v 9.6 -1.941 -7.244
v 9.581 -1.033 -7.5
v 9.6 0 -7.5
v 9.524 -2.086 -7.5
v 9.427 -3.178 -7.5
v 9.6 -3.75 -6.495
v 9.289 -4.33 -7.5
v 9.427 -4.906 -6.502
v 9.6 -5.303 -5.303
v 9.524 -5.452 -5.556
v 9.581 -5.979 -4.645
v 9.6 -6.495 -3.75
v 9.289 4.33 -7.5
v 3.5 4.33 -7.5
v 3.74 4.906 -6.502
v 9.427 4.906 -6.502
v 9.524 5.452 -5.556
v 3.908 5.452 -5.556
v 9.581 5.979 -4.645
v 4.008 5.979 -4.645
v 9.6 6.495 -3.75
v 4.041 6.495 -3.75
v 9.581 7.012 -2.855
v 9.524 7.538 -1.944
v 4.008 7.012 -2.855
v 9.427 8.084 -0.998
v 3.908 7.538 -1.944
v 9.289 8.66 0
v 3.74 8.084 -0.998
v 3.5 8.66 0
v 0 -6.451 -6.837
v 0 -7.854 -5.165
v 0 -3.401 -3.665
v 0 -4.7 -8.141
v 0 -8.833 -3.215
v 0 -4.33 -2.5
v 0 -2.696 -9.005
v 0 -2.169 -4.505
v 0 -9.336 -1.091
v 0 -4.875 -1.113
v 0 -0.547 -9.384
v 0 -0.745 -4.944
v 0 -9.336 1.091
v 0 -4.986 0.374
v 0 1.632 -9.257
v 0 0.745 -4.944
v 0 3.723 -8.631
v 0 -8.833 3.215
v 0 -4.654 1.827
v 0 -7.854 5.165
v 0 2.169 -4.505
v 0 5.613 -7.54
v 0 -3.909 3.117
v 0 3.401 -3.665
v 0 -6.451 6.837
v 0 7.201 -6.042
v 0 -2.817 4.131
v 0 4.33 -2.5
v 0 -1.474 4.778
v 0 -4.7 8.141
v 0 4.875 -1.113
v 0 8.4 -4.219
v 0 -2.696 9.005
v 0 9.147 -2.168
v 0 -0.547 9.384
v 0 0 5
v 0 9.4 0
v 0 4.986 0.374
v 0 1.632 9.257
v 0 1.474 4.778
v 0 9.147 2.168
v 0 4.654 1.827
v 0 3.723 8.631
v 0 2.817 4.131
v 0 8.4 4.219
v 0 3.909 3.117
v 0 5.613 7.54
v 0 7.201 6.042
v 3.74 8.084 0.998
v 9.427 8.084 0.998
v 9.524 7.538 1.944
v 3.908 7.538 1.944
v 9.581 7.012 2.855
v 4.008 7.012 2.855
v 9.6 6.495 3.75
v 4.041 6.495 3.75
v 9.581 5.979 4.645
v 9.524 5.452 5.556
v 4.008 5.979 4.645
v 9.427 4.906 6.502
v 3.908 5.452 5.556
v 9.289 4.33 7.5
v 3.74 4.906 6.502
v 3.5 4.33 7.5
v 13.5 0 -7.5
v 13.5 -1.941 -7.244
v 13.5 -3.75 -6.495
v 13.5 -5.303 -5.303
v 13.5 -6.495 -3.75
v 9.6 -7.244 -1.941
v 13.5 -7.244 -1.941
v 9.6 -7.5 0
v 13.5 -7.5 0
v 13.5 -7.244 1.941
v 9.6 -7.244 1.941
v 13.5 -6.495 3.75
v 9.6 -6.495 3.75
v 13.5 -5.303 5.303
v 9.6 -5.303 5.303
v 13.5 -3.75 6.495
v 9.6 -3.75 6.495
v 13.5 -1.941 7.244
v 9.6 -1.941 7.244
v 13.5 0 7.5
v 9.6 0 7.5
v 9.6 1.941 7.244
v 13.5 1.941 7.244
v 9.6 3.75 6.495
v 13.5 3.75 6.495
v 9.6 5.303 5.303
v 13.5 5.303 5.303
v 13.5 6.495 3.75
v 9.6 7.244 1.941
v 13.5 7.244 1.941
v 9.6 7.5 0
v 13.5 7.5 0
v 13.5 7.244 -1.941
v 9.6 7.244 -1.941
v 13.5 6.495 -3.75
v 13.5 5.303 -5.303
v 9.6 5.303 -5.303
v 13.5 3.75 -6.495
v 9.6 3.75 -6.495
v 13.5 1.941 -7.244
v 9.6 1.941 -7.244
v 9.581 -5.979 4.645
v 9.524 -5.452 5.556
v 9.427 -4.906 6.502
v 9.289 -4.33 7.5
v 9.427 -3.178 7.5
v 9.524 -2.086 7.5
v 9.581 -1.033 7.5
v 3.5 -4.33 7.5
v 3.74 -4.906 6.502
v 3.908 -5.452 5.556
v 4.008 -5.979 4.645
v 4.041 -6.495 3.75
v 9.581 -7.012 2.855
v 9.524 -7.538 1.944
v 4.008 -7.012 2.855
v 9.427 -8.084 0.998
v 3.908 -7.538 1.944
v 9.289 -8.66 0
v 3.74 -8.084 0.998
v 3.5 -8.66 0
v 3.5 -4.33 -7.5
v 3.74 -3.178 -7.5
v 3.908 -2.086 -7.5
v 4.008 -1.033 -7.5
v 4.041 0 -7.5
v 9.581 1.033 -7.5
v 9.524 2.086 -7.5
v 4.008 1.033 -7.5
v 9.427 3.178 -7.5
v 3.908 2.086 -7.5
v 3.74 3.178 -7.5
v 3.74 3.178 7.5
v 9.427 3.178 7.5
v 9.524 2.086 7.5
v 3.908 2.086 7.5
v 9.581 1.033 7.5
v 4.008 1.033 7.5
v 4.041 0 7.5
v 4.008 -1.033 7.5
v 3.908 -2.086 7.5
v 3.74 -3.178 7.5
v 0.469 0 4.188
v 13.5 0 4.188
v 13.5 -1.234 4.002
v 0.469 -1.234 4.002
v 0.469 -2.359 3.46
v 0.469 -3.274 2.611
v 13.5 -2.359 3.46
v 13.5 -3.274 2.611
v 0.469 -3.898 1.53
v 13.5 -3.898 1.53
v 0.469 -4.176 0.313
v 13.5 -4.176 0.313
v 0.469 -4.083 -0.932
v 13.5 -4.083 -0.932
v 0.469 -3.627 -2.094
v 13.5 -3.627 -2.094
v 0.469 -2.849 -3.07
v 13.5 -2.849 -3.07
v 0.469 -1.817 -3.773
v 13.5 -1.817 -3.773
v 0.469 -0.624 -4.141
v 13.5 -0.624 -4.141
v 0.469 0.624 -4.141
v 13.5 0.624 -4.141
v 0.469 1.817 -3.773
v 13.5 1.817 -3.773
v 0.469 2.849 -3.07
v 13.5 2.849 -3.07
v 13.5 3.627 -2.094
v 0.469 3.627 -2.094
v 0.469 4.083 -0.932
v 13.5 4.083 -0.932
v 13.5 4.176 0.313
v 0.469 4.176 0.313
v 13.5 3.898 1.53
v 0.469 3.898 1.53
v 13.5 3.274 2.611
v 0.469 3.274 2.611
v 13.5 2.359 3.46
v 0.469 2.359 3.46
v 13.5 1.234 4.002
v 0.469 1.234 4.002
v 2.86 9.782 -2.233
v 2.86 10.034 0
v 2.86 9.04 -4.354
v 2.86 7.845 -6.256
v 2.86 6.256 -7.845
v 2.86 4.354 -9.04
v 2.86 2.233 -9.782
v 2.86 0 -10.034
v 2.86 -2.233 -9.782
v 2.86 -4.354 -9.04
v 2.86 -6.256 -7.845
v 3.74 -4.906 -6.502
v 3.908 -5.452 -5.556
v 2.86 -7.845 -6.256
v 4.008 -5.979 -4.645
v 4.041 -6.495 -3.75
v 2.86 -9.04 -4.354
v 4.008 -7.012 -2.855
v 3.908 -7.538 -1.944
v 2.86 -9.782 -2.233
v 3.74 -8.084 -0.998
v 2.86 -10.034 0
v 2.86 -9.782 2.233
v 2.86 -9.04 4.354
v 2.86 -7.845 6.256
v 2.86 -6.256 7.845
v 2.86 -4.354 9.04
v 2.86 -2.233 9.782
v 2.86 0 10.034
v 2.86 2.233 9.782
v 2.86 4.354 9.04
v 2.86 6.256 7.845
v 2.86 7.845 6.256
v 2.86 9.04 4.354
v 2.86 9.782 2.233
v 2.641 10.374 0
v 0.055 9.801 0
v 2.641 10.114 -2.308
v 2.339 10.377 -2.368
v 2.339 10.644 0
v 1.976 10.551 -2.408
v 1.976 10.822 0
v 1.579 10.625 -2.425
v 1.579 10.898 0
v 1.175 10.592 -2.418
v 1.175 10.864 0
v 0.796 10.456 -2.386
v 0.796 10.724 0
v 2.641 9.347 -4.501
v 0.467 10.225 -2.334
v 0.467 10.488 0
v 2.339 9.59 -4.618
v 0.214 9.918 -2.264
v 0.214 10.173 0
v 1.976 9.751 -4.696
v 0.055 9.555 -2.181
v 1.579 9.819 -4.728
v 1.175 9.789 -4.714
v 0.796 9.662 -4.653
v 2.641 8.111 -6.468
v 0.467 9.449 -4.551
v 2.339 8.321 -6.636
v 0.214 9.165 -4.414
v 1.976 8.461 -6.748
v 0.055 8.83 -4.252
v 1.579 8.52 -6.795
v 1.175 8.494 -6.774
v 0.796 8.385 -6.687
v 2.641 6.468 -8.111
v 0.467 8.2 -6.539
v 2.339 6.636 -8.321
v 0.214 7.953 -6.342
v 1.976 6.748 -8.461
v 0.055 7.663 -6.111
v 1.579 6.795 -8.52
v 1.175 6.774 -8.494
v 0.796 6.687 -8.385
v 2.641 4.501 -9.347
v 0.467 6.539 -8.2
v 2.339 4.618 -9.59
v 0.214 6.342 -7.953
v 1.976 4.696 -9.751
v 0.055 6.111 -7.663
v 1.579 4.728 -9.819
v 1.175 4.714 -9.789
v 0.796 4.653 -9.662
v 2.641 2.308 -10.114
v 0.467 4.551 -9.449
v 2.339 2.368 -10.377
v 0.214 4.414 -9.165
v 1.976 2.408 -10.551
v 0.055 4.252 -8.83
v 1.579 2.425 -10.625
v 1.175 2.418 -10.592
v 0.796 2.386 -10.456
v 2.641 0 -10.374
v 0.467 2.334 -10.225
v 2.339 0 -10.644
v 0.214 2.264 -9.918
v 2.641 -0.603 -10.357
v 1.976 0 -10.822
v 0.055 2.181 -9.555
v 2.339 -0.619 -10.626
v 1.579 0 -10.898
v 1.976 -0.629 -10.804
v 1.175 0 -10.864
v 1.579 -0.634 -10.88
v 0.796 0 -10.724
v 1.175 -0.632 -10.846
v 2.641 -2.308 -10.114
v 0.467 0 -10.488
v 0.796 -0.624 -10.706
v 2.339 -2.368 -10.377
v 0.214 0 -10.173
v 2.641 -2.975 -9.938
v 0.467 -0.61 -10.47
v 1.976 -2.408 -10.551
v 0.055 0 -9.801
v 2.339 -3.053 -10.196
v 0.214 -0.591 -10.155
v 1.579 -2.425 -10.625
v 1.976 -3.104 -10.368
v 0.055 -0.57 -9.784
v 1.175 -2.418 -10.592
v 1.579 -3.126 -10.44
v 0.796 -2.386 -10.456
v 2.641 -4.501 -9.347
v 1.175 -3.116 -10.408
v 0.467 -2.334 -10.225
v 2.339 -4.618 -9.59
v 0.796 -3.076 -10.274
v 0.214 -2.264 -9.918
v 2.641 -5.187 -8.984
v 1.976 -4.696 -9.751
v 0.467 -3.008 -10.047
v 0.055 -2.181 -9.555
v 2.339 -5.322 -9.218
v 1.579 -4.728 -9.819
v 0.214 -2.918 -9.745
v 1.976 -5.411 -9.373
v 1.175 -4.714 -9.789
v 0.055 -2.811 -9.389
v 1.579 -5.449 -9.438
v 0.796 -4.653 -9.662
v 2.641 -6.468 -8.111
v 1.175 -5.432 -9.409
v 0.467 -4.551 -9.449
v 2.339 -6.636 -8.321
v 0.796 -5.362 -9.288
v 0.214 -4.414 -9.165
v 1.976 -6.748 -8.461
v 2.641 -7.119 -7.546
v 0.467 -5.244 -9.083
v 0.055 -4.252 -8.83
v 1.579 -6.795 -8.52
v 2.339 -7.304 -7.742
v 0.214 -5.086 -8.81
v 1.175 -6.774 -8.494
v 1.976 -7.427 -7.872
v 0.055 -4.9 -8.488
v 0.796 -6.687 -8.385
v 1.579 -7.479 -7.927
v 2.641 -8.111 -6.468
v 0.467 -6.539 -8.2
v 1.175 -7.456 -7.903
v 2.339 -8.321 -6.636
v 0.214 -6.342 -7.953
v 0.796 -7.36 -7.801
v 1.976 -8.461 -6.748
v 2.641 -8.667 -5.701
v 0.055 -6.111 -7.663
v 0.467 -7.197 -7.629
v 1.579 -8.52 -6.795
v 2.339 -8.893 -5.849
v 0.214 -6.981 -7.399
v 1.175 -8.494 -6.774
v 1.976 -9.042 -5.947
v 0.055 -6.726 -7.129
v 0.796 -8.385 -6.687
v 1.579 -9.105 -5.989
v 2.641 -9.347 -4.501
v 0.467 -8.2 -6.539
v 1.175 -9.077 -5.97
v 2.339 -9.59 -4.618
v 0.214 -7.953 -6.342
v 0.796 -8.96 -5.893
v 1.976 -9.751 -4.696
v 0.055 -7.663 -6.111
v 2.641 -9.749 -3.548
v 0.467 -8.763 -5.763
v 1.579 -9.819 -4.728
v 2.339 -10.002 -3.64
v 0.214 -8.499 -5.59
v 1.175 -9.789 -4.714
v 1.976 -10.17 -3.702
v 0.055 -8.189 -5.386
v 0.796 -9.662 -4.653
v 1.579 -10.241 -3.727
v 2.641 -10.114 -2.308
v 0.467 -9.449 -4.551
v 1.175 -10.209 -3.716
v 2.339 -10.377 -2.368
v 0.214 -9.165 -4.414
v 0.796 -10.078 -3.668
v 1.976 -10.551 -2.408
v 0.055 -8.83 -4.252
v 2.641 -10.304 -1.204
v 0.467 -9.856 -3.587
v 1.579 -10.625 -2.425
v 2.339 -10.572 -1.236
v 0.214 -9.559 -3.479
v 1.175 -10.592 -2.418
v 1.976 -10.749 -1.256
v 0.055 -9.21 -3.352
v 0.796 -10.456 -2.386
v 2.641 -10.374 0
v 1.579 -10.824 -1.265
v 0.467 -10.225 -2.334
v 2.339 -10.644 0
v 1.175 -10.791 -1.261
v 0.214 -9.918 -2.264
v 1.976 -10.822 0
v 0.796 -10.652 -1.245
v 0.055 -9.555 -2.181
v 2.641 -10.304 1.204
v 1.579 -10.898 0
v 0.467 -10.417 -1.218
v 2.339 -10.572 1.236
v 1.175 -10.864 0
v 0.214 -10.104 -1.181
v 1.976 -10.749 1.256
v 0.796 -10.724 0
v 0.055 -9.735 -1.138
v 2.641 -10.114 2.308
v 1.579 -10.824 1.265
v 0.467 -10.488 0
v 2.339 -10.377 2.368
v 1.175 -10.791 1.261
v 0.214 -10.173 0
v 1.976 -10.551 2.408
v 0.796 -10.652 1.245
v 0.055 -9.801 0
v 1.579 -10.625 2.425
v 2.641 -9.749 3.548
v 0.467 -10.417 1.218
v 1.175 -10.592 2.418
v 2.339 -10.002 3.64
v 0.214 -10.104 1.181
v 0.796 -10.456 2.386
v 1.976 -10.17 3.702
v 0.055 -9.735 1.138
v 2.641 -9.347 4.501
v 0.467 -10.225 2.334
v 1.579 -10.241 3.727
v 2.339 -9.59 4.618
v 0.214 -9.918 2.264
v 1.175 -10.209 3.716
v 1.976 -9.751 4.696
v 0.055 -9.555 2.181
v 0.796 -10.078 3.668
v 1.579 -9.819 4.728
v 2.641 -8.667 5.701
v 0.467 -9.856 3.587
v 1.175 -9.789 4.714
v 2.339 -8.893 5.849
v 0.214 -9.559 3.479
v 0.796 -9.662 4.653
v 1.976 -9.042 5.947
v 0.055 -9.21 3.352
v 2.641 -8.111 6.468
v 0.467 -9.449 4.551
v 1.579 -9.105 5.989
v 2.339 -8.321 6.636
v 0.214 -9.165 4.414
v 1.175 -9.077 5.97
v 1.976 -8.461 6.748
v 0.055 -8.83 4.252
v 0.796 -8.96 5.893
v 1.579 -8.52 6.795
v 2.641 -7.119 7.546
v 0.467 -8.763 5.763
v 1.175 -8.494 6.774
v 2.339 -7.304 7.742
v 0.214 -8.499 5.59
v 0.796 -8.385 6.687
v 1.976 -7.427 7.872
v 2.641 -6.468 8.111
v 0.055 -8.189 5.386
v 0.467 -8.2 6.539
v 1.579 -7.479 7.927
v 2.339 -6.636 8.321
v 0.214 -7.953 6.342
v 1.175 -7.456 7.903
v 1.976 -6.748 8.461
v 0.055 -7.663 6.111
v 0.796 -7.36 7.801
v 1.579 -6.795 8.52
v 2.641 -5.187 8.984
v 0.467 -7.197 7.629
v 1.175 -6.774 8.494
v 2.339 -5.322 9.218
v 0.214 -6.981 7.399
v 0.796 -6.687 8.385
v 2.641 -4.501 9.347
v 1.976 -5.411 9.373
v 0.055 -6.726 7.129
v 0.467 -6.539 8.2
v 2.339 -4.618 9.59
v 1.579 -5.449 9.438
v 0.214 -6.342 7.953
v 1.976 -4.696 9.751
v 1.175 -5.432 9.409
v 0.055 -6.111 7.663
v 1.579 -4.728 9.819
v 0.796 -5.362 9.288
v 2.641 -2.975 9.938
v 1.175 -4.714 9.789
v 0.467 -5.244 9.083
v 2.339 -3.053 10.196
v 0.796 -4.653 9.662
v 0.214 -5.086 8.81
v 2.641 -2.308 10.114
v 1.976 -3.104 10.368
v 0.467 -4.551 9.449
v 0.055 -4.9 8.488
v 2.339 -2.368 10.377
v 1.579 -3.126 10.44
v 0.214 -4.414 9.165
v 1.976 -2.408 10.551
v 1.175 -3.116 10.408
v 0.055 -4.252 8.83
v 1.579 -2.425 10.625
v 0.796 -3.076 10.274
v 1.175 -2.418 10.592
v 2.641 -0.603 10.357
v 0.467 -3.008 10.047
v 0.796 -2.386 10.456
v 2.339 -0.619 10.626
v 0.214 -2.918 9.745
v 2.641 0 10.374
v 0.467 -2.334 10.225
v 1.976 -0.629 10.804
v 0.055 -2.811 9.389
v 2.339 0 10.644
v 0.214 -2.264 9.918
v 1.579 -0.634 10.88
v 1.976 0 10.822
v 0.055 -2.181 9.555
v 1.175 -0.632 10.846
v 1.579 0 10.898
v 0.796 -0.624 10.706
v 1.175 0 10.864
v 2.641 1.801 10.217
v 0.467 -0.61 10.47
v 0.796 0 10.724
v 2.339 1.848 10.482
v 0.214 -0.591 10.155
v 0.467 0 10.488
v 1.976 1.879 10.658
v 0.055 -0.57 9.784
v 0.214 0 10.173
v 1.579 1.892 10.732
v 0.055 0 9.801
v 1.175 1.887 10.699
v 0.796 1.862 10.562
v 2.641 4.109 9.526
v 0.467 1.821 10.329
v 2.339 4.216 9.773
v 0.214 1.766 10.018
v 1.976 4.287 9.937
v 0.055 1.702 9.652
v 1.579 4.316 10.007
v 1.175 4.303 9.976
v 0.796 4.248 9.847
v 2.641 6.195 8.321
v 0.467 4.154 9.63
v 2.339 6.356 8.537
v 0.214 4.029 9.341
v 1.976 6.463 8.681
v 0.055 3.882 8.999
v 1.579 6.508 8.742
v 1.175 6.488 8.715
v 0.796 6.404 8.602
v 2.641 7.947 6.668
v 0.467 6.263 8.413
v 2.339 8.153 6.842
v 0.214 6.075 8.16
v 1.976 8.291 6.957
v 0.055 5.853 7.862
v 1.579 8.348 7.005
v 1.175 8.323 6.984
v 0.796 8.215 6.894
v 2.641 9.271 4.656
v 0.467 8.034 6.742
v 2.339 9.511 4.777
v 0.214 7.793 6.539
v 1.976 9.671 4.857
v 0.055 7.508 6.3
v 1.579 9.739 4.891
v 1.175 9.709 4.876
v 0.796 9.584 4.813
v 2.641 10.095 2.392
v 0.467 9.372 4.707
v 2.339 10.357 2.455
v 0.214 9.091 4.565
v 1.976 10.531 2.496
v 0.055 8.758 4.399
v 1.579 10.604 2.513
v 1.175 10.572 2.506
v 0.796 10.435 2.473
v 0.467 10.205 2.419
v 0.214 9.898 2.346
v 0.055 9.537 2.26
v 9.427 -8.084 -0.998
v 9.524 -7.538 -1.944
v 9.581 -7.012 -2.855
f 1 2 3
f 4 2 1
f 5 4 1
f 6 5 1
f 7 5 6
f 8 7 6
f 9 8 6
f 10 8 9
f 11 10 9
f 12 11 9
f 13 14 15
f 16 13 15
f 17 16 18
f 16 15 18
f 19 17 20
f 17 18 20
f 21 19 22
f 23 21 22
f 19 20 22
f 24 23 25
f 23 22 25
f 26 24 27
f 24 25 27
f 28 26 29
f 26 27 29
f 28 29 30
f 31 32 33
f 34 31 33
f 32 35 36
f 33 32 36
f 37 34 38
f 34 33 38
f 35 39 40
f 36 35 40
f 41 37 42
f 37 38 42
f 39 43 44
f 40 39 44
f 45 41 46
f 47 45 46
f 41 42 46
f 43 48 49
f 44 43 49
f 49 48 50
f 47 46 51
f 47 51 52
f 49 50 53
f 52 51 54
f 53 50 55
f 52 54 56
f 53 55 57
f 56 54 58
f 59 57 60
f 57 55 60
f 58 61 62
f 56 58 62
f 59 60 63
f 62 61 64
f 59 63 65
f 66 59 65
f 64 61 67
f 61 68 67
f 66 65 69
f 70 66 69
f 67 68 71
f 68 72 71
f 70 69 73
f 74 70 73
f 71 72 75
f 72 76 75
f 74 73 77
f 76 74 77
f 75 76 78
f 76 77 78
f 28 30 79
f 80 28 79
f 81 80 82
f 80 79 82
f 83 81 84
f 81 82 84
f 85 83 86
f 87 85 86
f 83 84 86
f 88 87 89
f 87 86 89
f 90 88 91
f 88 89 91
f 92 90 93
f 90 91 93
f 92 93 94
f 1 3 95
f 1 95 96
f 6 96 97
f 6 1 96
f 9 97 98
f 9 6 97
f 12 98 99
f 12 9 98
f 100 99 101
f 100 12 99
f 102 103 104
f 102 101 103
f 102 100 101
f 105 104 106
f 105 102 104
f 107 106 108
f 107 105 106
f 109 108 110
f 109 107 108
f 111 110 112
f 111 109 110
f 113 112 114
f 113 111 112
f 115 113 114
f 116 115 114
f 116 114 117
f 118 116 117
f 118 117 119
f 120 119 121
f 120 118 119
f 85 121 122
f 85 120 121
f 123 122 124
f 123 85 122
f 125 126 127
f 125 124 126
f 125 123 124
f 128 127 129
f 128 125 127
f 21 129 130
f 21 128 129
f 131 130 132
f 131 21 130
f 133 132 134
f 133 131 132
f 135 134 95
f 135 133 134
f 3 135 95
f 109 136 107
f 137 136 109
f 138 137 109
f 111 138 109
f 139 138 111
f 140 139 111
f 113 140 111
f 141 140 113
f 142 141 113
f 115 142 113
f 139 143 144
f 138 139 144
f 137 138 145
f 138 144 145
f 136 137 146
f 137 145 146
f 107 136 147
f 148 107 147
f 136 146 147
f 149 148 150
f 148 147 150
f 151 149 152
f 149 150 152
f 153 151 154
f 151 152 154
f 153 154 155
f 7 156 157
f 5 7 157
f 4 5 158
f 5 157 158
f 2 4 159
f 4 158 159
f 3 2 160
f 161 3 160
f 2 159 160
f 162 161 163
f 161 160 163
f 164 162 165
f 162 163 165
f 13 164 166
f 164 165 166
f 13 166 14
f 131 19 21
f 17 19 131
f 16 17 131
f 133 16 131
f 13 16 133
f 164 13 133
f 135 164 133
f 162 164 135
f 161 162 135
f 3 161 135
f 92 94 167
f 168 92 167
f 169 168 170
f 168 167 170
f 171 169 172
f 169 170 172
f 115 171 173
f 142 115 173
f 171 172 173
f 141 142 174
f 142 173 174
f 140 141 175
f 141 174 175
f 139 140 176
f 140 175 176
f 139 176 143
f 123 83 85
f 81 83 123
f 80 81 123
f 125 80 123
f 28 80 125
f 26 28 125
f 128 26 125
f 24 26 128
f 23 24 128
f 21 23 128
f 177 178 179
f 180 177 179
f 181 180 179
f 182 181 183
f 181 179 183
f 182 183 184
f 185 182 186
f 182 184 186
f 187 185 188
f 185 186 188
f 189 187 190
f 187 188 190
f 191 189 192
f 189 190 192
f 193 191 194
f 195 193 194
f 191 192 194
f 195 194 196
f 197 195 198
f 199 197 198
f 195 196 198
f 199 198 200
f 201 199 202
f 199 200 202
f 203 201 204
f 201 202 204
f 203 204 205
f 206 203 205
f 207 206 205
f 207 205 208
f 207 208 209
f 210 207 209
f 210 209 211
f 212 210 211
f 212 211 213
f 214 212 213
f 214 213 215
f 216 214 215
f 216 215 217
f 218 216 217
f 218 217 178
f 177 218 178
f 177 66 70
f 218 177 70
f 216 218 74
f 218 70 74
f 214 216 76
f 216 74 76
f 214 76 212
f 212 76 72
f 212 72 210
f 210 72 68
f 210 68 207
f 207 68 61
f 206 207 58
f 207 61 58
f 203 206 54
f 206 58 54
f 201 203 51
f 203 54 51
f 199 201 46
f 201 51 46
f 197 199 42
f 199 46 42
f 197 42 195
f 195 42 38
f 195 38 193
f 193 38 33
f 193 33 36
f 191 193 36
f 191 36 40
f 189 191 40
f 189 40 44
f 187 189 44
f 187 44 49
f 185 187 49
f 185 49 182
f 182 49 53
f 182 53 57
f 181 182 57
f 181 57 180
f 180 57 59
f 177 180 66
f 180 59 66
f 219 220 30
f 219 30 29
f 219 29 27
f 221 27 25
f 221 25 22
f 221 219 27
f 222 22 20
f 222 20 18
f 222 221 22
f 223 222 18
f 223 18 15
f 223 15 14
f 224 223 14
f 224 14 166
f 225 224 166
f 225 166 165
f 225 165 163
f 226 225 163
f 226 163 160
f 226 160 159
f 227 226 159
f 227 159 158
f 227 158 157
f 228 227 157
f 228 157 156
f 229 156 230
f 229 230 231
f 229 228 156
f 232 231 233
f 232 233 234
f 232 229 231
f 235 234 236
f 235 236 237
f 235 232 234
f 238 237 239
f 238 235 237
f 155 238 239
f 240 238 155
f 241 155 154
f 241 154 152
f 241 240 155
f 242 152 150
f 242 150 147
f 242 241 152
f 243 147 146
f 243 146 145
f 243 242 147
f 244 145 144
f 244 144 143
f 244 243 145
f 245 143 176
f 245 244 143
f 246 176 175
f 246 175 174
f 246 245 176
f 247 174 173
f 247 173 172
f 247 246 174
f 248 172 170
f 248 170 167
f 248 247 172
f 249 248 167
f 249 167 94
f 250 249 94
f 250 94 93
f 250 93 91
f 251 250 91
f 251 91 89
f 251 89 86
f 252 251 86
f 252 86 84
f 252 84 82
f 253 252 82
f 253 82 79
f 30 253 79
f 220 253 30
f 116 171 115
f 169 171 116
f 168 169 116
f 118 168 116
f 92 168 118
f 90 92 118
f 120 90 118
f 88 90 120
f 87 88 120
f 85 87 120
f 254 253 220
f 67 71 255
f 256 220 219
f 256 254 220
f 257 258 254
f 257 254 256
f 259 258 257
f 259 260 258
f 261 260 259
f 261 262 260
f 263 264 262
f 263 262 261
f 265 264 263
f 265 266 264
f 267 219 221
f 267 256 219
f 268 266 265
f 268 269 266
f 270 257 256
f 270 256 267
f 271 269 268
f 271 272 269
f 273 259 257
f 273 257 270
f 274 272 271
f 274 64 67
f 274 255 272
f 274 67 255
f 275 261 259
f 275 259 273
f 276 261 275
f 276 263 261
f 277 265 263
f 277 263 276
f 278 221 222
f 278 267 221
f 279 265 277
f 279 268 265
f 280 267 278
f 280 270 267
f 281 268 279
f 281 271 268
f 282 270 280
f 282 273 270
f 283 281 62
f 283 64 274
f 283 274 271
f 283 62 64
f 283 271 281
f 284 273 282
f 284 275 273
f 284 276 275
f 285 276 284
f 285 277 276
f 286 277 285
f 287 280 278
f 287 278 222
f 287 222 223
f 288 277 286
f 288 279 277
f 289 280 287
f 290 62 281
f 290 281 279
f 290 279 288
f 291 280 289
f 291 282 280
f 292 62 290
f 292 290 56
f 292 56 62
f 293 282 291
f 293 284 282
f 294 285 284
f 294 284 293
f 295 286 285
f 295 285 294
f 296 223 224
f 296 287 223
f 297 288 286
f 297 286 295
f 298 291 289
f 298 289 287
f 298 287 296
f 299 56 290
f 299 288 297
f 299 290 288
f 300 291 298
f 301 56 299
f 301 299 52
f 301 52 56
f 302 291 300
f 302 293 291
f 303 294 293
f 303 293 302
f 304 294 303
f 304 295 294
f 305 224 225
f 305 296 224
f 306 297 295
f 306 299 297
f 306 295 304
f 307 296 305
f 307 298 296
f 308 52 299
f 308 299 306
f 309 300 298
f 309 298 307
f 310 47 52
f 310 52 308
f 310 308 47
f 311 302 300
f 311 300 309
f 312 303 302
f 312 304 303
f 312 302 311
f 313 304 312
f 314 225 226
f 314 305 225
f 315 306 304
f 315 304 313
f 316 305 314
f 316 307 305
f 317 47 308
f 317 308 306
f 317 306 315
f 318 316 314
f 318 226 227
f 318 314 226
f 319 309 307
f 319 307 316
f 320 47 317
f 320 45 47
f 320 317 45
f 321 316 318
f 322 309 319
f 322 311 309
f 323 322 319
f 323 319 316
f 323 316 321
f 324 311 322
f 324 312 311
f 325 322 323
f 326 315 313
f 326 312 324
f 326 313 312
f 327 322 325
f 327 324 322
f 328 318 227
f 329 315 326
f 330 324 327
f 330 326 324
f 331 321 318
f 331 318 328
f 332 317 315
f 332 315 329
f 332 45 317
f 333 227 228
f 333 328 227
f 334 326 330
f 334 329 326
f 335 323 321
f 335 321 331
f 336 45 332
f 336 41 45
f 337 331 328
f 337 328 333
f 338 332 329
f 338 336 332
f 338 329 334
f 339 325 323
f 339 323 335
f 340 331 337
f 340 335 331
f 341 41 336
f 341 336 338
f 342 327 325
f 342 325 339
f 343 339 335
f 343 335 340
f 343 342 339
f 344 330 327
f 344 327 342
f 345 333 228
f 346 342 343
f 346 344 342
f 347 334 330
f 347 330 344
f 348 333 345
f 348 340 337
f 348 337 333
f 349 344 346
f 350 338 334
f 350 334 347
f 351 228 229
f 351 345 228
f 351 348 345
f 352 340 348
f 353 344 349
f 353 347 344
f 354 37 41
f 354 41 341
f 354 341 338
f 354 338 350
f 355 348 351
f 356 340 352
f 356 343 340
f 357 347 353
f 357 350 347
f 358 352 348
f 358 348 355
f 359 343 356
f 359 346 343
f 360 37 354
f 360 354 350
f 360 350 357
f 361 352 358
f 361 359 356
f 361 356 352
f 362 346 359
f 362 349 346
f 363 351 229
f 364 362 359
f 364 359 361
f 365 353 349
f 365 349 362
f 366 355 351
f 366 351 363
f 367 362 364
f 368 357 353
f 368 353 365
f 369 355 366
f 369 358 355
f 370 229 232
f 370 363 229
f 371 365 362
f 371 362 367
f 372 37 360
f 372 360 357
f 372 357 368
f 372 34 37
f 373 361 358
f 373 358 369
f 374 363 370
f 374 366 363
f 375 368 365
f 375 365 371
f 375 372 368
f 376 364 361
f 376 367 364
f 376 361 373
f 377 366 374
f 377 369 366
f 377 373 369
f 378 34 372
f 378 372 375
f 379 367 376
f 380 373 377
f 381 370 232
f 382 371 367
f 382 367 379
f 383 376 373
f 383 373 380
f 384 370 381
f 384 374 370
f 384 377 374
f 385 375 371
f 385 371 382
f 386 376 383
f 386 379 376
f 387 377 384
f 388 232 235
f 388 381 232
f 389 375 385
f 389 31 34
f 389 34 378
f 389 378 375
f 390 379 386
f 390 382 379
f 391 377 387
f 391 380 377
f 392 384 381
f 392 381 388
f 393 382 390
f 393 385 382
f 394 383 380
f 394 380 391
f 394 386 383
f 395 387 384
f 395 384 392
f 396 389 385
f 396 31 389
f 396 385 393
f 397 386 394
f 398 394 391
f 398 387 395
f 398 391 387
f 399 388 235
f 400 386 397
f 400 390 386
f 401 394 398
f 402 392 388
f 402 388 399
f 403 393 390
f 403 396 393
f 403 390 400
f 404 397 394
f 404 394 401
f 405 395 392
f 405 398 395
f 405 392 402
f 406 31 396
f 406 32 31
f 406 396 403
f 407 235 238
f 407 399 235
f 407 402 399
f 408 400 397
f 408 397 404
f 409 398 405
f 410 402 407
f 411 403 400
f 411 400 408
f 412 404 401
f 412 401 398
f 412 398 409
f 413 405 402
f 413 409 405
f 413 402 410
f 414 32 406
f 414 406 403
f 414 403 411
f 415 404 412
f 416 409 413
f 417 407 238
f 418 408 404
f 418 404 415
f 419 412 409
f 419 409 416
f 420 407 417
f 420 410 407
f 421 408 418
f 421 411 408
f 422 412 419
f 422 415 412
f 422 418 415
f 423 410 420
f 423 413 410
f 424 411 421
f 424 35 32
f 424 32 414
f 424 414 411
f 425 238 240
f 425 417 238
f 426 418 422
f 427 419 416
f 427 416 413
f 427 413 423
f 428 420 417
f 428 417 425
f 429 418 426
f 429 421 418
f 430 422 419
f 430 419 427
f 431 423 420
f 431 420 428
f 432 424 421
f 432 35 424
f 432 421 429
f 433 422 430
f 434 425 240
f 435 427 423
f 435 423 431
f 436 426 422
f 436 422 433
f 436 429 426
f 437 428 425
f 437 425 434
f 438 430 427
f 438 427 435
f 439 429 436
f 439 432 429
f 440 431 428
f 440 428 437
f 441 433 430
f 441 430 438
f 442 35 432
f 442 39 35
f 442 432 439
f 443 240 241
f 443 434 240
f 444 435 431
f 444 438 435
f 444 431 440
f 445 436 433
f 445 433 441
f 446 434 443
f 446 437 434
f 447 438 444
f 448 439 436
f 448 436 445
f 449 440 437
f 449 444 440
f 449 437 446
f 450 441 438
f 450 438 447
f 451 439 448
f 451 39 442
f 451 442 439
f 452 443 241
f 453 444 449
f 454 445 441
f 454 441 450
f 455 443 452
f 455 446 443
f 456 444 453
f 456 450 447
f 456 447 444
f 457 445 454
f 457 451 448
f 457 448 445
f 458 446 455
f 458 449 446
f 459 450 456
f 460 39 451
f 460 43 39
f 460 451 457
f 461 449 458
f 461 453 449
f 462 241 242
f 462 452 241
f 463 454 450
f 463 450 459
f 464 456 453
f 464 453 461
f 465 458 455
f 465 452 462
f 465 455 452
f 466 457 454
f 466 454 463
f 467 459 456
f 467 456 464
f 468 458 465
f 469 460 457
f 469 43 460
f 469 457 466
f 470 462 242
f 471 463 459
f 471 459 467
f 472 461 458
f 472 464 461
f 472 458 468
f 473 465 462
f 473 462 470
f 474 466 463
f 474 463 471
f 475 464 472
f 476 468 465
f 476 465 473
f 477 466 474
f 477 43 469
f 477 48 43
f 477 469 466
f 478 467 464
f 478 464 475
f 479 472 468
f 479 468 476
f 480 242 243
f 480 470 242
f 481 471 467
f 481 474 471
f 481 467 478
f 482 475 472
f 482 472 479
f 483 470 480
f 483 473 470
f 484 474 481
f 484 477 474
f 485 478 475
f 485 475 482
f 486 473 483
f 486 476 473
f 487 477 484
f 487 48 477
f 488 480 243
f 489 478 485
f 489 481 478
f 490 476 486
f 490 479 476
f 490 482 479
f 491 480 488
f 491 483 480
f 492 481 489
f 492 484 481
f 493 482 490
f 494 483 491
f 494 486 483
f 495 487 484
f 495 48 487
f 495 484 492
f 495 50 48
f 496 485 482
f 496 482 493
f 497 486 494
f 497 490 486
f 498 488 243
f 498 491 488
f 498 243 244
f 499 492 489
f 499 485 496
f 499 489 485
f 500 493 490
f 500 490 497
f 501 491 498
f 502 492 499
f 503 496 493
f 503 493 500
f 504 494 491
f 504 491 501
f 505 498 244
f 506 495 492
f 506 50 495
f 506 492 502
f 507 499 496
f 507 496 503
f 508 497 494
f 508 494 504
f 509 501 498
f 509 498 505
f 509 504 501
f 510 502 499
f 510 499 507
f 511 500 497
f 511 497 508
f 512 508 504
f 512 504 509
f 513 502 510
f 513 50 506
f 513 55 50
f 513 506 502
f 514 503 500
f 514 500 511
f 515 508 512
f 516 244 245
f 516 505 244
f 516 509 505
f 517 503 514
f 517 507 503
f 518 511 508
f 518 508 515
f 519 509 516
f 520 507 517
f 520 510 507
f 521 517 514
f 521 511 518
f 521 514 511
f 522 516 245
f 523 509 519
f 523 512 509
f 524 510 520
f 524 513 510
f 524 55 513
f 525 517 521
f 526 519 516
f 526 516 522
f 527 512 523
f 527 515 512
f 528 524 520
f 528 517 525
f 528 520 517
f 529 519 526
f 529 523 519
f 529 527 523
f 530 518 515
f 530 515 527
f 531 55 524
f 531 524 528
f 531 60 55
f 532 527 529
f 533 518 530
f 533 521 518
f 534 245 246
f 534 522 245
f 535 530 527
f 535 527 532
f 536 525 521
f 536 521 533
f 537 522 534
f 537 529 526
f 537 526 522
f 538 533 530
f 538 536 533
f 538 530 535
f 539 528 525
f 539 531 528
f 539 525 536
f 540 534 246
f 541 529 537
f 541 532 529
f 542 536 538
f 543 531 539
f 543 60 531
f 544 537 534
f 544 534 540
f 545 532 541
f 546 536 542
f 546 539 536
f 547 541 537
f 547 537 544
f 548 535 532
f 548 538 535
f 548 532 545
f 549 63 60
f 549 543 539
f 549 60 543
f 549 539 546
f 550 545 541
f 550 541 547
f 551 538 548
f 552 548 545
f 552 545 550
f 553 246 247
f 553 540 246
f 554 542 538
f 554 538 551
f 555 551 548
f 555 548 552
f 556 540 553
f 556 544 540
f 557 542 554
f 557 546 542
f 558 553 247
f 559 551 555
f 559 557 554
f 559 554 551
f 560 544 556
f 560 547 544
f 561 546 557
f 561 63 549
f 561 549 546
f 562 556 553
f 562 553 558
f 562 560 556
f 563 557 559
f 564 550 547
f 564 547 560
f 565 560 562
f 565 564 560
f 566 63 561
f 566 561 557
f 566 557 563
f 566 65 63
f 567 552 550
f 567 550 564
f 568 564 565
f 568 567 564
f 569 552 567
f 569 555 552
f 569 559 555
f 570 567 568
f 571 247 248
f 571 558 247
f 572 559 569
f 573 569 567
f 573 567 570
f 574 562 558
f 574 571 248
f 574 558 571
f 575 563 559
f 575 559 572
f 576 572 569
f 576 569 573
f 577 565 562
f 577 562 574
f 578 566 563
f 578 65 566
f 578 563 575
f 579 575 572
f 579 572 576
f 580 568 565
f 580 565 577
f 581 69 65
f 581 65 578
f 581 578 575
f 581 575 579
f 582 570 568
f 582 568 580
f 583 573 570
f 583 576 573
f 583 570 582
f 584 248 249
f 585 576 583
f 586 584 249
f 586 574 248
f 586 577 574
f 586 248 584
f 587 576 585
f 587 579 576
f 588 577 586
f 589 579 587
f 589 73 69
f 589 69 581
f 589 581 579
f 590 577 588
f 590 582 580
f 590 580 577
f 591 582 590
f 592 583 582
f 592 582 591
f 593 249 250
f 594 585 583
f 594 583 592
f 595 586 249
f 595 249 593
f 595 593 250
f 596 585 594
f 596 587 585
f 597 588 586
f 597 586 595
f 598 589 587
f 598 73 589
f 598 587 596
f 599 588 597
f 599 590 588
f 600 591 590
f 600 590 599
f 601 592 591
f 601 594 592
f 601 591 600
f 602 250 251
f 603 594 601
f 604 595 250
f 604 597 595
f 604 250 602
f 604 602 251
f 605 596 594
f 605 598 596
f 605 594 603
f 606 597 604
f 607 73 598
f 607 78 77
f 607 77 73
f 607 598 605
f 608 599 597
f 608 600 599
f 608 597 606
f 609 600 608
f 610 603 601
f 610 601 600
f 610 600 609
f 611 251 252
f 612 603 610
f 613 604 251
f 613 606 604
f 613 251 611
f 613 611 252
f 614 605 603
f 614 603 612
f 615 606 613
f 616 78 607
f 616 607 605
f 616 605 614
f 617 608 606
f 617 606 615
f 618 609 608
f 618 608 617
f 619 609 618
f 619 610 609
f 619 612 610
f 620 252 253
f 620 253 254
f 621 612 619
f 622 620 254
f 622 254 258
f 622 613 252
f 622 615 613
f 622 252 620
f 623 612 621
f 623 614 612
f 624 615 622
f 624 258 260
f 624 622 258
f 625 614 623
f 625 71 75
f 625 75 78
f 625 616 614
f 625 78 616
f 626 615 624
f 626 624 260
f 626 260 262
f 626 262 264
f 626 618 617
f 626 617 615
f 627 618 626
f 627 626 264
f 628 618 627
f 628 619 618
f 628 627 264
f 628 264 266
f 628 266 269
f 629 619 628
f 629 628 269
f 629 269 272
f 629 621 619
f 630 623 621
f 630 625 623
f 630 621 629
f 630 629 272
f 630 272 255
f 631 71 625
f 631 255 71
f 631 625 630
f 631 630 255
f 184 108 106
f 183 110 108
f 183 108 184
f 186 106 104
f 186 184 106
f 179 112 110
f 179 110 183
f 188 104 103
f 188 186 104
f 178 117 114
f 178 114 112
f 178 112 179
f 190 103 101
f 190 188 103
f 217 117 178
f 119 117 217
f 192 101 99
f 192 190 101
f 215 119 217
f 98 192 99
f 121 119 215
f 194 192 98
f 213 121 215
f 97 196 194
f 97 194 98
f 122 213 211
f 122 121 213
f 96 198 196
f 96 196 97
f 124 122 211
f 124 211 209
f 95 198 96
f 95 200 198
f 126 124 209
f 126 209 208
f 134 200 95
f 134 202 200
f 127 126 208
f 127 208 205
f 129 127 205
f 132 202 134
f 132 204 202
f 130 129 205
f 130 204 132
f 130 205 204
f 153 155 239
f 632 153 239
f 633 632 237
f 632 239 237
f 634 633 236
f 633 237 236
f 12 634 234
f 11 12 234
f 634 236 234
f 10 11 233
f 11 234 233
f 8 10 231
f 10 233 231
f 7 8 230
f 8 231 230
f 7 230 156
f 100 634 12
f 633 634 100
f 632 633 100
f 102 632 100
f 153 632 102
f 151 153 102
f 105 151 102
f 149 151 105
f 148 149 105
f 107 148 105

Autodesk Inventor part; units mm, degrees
ref_plane "YZ Plane" through (0, 0, 0) normal (1, 0, 0) x (0, 1, 0)
ref_plane "XZ Plane" through (0, 0, 0) normal (0, 1, 0) x (-1, 0, 0)
sketch "Szkic1" plane through (0, 0, 0) normal (0, 0, 1) x (1, 0, 0)
  line L0 (-3.0053, 0) -> (16.2509, 0) projected
  line L1 (4.0411, 7.5) -> (2.8595, 10.0339)
  line L2 (4.0411, 7.5) -> (13.5, 7.5) construction
  line L3 (13.5, 7.5) -> (13.5, 0) construction
  arc A0 (2.8595, 10.0339) -> (0, 9.4) centre (1.5, 9.4) ccw
  line L4 (4.0411, 7.5) -> (4.0411, 0)
  line L5 (0, -2.2363) -> (0, 13.4177) projected
  point P0 (0, 0)
  dimension "d1" = 15
  dimension "d3" = 21.8
  dimension "d4" = 1.5
  dimension "d16" = 13.5
  dimension "d17" = 25
revolve "Pierścień" add sketch "Szkic1" angle 360 about axis through (-10, 0, 0) along (1, 0, 0)
sketch "Szkic2" plane through (0, 0, 0) normal (-1, 0, 0) x (0, 0, 1)
  circle A0 centre (0, 0) radius 4.9
  line L0 (-7.5, -4.3301) -> (-7.5, 4.3301)
  line L1 (-7.5, 4.3301) -> (0, 8.6603)
  line L2 (0, 8.6603) -> (7.5, 4.3301)
  line L3 (7.5, 4.3301) -> (7.5, -4.3301)
  line L4 (7.5, -4.3301) -> (0, -8.6603)
  line L5 (0, -8.6603) -> (-7.5, -4.3301)
  circle A1 centre (0, 0) radius 9.4 projected
  dimension "d5" = 17.3205
extrude "Bryła" add sketch "Szkic2" against normal blind 9.6 contours A0 | L0 L1 L2 L3 L4 L5
sketch "Szkic3" plane through (9.6, 0, 0) normal (1, 0, 0) x (0, 0, -1)
  circle A0 centre (0, 0) radius 7.5
  dimension "d19" = 15
extrude "Zamek" add sketch "Szkic3" along normal blind 3.9
sketch "Szkic4" plane through (0, 0, 0) normal (-1, 0, 0) x (0, 0, 1)
  circle A0 centre (0, 0) radius 4.9
  circle A1 centre (0, 0) radius 9.4 projected
hole "Gwint" at (0, 0, 0) direction (1, 0, 0) diameter 8.376 end through all thread size "M10x1.5" class "6H" standard "ISO Metric profile"
sketch "Szkic5" plane through (0, 0, 0) normal (0, 0, 1) x (1, 0, 0)
  line L0 (3.5, 8.6603) -> (9.6, 8.6603) projected
  line L1 (9.6, 4.3301) -> (9.6, 8.6603) projected
  line L2 (0, -9.4) -> (0, 9.4) projected
  line L3 (-1.92, 0) -> (11.52, 0) projected
  line L4 (9.2891, 8.6603) -> (9.6, 7.5)
  dimension "d9" = 15
  dimension "d10" = 15
revolve "Faza1" cut sketch "Szkic5" angle 360 about axis through (-10, 0, 0) along (1, 0, 0)
chamfer "Faza2" distance 0.8119 angle 30 1 edges at (0, 0, -4.188) measured on face at (0, 7.5614, -0.9181)
ref_plane "Work Plane1" through (33.6561, 0, 0) normal (0, 0, -1) x (-1, 0, 0)
equation "\"d1\" = SW"
equation "\"d3\" = LADI"
equation "\"d4\" = PHH"
equation "\"d16\" = KOH"
equation "\"d17\" = KEWI"
equation "\"d5\" = 1.1547 * SW"
equation "\"d6\" = KOH1"
equation "\"d19\" = SD2"
equation "\"d11\" = KOH - KOH1"
equation "\"d9\" = ANG1"
equation "\"d10\" = SW0"
equation "\"d13\" = -0.5 * GD1 + 0.5 * NND"
equation "\"d57\" = -0.5 * GD1 + 0.5 * NND"
equation "\"ANG1\" = 15deg"
equation "\"KEWI\" = 25deg"
equation "\"LADI\" = 21.8"
equation "\"SW\" = 15"
equation "\"PHH\" = RR"
equation "\"KOH\" = 13.5"
equation "\"SW0\" = SW"
equation "\"d0\" = LADI"
equation "\"d2\" = PHH"
equation "\"KOH1\" = 9.6"
equation "\"SD2\" = SW"
equation "\"GUL\" = 0.541266 * PTC"
equation "\"RR\" = 1.5"
equation "\"TOA\" = 30deg"
equation "\"PTC\" = 1.5"
equation "\"GAL\" = 0.541266 * PTC"
equation "\"E0\" = 1.155 * SW"
equation "\"GD1\" = 8.376202"
equation "\"NND\" = 10"
properties part number "DIN 6926 - M10" material "Stal, miękka"
